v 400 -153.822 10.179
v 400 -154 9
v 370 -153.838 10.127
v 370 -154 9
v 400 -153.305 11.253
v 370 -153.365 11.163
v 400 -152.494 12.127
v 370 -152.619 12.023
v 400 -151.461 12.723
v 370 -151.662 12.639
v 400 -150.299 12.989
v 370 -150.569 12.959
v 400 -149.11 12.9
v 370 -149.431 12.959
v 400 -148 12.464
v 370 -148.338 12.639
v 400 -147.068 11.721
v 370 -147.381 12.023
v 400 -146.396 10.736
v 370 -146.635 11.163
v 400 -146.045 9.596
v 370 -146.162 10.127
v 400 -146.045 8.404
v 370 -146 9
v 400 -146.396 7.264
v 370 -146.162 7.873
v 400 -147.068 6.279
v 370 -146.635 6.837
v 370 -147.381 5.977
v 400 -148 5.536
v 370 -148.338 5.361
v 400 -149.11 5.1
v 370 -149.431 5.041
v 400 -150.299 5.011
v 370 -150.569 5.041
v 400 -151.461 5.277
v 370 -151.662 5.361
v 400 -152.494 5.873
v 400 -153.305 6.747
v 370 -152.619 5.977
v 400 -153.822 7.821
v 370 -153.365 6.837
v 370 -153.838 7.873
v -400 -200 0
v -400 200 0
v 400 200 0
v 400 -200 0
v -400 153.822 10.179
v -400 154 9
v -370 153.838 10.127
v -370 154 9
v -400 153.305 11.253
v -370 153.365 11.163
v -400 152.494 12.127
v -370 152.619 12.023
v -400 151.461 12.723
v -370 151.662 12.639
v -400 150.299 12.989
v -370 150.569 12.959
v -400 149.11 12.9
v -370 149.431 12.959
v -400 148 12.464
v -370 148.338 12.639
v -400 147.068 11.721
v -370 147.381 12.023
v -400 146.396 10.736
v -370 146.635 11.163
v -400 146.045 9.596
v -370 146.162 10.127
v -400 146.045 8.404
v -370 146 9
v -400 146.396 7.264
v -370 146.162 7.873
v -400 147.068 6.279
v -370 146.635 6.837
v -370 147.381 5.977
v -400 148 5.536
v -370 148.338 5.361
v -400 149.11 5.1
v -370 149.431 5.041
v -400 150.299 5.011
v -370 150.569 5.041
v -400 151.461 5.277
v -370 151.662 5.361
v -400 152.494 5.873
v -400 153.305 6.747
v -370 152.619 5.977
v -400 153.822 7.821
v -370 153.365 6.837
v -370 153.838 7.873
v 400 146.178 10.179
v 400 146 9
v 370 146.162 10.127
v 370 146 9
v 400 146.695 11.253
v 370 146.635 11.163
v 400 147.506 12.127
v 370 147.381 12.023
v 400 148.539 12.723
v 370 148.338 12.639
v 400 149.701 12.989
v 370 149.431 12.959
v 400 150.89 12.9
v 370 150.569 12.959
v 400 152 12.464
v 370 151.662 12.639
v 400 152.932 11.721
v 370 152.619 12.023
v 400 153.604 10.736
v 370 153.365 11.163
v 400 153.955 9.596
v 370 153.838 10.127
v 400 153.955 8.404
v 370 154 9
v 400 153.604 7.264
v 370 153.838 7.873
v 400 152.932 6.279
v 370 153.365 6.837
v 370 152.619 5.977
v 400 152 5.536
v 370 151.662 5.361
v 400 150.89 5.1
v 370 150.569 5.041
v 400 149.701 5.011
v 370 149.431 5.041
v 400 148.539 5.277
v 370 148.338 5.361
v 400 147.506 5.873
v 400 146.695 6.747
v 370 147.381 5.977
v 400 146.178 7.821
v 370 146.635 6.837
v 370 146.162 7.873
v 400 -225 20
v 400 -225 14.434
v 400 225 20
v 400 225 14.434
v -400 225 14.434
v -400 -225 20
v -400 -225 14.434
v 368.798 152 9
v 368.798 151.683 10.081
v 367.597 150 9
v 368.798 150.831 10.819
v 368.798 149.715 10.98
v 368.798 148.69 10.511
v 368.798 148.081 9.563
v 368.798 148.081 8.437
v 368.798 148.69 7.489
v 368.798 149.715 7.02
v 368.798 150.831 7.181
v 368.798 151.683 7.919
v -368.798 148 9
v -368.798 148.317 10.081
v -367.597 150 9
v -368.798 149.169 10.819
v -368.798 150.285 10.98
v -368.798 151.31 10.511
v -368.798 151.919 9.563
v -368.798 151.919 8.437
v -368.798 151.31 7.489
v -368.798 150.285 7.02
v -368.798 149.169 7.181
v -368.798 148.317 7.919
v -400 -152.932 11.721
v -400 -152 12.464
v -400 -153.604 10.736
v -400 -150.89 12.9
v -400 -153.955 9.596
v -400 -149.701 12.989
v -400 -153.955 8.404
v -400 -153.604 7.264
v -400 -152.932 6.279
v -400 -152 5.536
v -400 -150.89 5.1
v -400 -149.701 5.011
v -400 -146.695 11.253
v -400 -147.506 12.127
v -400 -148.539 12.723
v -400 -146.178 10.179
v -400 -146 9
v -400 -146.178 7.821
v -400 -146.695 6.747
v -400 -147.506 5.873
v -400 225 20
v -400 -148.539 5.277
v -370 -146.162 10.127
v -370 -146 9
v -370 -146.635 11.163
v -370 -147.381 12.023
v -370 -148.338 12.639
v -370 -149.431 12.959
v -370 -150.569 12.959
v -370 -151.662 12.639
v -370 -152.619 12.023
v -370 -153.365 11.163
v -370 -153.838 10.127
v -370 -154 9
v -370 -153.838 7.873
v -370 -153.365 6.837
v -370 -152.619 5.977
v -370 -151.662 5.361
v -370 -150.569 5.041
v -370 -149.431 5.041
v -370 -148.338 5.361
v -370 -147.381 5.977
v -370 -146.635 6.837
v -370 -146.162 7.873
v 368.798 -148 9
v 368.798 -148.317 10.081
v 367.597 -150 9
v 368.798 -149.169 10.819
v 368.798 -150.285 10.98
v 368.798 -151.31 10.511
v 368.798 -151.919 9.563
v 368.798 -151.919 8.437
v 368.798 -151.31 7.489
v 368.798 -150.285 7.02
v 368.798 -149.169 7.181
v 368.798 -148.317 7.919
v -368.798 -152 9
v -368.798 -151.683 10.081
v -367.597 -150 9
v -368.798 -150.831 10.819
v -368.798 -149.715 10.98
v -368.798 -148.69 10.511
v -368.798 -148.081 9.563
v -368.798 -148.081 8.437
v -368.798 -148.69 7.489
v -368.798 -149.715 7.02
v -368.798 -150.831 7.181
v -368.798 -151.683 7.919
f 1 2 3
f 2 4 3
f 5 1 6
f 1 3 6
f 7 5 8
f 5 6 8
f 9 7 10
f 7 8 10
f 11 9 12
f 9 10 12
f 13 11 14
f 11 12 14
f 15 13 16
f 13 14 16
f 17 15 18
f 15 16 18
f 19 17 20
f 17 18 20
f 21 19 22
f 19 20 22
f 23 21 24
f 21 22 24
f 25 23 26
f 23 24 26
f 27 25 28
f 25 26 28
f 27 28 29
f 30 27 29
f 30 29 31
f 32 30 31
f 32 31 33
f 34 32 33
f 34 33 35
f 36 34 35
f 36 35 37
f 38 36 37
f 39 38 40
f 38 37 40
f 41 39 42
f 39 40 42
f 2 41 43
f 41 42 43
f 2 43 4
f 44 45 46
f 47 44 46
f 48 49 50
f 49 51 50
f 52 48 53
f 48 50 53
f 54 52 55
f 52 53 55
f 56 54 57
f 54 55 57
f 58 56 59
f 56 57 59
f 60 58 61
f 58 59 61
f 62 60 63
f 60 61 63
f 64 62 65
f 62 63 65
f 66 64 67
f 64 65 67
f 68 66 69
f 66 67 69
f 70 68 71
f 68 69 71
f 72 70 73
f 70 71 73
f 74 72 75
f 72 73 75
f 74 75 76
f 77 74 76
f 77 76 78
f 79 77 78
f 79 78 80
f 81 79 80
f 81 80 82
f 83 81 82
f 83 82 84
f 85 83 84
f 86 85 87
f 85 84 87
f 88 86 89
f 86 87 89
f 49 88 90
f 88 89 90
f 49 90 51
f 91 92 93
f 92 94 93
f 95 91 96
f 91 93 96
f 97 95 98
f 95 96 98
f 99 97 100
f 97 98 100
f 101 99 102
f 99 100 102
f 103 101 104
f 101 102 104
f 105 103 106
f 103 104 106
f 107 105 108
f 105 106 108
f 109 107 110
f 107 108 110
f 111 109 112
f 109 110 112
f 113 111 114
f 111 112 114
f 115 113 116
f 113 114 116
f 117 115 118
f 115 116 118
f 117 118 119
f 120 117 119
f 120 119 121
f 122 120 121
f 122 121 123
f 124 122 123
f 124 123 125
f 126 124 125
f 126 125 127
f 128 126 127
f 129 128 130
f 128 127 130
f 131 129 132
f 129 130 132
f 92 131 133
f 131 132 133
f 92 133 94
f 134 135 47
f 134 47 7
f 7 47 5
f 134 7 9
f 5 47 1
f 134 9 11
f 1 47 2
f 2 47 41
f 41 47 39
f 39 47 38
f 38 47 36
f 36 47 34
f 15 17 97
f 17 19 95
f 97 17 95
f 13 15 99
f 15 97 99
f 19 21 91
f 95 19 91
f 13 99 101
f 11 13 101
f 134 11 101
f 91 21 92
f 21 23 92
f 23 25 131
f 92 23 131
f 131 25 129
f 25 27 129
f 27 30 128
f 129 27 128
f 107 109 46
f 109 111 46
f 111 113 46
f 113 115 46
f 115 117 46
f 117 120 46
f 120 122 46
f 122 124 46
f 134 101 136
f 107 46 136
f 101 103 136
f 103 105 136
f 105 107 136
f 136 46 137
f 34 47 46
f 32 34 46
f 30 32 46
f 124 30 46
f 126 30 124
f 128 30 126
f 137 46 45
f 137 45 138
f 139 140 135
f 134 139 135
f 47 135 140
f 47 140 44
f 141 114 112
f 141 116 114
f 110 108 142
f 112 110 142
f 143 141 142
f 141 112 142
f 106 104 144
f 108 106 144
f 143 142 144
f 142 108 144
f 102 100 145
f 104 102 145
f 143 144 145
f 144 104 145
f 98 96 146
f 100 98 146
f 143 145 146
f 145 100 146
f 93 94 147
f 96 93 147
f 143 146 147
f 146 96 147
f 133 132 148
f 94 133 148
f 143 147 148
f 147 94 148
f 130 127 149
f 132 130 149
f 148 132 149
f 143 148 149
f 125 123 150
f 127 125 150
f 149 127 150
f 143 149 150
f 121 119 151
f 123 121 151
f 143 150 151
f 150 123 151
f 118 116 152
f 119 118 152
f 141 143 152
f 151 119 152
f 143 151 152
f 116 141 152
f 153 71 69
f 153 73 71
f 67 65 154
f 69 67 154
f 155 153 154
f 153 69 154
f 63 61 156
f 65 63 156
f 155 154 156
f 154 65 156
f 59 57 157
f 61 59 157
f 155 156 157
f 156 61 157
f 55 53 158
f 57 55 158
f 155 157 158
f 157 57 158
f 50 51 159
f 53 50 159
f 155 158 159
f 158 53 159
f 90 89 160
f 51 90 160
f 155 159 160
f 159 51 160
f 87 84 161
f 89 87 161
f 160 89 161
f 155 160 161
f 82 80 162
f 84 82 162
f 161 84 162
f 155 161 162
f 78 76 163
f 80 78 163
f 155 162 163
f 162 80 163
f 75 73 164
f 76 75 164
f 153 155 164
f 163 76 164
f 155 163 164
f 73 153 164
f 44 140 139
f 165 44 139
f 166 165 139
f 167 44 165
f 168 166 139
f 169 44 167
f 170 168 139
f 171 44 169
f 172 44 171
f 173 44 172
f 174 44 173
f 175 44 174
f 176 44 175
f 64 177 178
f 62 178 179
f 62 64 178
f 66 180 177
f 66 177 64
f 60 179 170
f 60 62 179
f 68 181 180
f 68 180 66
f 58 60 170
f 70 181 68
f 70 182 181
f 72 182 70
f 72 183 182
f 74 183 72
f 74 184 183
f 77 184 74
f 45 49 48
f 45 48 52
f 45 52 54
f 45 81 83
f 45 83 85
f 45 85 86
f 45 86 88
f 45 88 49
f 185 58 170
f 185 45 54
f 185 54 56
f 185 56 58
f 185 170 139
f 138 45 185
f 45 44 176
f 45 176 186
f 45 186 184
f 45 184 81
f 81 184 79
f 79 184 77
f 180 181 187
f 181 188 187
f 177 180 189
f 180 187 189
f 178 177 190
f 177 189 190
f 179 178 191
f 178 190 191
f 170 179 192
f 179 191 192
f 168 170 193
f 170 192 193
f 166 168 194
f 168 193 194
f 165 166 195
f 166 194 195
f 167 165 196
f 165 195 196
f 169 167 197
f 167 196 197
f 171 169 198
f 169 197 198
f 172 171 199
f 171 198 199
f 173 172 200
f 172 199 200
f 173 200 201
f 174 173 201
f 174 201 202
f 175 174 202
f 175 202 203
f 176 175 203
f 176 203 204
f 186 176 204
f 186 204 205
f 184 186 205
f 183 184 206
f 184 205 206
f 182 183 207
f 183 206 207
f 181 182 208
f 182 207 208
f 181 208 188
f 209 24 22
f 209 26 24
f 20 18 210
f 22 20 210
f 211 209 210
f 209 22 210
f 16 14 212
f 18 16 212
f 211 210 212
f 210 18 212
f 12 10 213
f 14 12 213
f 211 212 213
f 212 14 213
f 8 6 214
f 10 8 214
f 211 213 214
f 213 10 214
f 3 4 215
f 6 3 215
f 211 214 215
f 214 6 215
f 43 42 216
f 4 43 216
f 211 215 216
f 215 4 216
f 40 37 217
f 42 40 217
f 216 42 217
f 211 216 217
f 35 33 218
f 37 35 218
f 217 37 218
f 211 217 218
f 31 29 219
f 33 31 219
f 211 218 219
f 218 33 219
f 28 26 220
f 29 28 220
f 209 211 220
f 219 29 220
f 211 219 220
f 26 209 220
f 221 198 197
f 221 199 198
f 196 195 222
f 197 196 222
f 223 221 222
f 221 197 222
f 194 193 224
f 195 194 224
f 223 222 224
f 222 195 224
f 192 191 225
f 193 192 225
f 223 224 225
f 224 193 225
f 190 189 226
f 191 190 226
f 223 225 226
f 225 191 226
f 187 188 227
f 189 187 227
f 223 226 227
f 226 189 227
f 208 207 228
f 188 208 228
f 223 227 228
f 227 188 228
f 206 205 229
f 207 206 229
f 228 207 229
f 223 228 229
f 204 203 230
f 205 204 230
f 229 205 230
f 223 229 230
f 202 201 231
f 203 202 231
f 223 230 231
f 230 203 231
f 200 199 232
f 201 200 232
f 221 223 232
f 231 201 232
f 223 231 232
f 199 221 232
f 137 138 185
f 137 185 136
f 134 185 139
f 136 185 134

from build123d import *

# Parameters (mm, degrees)
F0_W           = 800
F0_H           = 450
F1_DEPTH       = 20
F3_START       = -400.001
F3_DEPTH       = 800.002
F6_D           = 8
F6_DEPTH       = 30
F6_TIP         = 2.4034424761
F6_ON_F5_D     = 8
F6_ON_F5_DEPTH = 30
F6_ON_F5_TIP   = 2.4034424761


with BuildPart() as f1:
    # F0 (on Top) → F1 (new body)
    with BuildSketch(Plane.XY):
        Rectangle(F0_W, F0_H)
    extrude(amount=F1_DEPTH)

    # F2 (on Right) → F3 (intersect)
    with BuildSketch(Plane.YZ.offset(F3_START)):
        Polygon((-200, 0), (200, 0), (234.6410161514, 20), (-234.6410161514, 20), align=None)
    extrude(amount=F3_DEPTH, mode=Mode.INTERSECT)

    # F6
    with Locations(Plane(origin=(-400, 0, 0), x_dir=(0, -1, 0), z_dir=(-1, 0, 0))):
        with Locations((-150, 9), (150, 9)):
            Hole(F6_D / 2, depth=F6_DEPTH)
            with Locations((0, 0, -(F6_DEPTH + F6_TIP / 2))):  # 118° drill point
                Cone(0, F6_D / 2, F6_TIP, mode=Mode.SUBTRACT)

    # F6 on F5
    with Locations(Plane.YZ.offset(400)):
        with Locations((150, 9), (-150, 9)):
            Hole(F6_ON_F5_D / 2, depth=F6_ON_F5_DEPTH)
            with Locations((0, 0, -(F6_ON_F5_DEPTH + F6_ON_F5_TIP / 2))):  # 118° drill point
                Cone(0, F6_ON_F5_D / 2, F6_ON_F5_TIP, mode=Mode.SUBTRACT)


solid = f1.part
